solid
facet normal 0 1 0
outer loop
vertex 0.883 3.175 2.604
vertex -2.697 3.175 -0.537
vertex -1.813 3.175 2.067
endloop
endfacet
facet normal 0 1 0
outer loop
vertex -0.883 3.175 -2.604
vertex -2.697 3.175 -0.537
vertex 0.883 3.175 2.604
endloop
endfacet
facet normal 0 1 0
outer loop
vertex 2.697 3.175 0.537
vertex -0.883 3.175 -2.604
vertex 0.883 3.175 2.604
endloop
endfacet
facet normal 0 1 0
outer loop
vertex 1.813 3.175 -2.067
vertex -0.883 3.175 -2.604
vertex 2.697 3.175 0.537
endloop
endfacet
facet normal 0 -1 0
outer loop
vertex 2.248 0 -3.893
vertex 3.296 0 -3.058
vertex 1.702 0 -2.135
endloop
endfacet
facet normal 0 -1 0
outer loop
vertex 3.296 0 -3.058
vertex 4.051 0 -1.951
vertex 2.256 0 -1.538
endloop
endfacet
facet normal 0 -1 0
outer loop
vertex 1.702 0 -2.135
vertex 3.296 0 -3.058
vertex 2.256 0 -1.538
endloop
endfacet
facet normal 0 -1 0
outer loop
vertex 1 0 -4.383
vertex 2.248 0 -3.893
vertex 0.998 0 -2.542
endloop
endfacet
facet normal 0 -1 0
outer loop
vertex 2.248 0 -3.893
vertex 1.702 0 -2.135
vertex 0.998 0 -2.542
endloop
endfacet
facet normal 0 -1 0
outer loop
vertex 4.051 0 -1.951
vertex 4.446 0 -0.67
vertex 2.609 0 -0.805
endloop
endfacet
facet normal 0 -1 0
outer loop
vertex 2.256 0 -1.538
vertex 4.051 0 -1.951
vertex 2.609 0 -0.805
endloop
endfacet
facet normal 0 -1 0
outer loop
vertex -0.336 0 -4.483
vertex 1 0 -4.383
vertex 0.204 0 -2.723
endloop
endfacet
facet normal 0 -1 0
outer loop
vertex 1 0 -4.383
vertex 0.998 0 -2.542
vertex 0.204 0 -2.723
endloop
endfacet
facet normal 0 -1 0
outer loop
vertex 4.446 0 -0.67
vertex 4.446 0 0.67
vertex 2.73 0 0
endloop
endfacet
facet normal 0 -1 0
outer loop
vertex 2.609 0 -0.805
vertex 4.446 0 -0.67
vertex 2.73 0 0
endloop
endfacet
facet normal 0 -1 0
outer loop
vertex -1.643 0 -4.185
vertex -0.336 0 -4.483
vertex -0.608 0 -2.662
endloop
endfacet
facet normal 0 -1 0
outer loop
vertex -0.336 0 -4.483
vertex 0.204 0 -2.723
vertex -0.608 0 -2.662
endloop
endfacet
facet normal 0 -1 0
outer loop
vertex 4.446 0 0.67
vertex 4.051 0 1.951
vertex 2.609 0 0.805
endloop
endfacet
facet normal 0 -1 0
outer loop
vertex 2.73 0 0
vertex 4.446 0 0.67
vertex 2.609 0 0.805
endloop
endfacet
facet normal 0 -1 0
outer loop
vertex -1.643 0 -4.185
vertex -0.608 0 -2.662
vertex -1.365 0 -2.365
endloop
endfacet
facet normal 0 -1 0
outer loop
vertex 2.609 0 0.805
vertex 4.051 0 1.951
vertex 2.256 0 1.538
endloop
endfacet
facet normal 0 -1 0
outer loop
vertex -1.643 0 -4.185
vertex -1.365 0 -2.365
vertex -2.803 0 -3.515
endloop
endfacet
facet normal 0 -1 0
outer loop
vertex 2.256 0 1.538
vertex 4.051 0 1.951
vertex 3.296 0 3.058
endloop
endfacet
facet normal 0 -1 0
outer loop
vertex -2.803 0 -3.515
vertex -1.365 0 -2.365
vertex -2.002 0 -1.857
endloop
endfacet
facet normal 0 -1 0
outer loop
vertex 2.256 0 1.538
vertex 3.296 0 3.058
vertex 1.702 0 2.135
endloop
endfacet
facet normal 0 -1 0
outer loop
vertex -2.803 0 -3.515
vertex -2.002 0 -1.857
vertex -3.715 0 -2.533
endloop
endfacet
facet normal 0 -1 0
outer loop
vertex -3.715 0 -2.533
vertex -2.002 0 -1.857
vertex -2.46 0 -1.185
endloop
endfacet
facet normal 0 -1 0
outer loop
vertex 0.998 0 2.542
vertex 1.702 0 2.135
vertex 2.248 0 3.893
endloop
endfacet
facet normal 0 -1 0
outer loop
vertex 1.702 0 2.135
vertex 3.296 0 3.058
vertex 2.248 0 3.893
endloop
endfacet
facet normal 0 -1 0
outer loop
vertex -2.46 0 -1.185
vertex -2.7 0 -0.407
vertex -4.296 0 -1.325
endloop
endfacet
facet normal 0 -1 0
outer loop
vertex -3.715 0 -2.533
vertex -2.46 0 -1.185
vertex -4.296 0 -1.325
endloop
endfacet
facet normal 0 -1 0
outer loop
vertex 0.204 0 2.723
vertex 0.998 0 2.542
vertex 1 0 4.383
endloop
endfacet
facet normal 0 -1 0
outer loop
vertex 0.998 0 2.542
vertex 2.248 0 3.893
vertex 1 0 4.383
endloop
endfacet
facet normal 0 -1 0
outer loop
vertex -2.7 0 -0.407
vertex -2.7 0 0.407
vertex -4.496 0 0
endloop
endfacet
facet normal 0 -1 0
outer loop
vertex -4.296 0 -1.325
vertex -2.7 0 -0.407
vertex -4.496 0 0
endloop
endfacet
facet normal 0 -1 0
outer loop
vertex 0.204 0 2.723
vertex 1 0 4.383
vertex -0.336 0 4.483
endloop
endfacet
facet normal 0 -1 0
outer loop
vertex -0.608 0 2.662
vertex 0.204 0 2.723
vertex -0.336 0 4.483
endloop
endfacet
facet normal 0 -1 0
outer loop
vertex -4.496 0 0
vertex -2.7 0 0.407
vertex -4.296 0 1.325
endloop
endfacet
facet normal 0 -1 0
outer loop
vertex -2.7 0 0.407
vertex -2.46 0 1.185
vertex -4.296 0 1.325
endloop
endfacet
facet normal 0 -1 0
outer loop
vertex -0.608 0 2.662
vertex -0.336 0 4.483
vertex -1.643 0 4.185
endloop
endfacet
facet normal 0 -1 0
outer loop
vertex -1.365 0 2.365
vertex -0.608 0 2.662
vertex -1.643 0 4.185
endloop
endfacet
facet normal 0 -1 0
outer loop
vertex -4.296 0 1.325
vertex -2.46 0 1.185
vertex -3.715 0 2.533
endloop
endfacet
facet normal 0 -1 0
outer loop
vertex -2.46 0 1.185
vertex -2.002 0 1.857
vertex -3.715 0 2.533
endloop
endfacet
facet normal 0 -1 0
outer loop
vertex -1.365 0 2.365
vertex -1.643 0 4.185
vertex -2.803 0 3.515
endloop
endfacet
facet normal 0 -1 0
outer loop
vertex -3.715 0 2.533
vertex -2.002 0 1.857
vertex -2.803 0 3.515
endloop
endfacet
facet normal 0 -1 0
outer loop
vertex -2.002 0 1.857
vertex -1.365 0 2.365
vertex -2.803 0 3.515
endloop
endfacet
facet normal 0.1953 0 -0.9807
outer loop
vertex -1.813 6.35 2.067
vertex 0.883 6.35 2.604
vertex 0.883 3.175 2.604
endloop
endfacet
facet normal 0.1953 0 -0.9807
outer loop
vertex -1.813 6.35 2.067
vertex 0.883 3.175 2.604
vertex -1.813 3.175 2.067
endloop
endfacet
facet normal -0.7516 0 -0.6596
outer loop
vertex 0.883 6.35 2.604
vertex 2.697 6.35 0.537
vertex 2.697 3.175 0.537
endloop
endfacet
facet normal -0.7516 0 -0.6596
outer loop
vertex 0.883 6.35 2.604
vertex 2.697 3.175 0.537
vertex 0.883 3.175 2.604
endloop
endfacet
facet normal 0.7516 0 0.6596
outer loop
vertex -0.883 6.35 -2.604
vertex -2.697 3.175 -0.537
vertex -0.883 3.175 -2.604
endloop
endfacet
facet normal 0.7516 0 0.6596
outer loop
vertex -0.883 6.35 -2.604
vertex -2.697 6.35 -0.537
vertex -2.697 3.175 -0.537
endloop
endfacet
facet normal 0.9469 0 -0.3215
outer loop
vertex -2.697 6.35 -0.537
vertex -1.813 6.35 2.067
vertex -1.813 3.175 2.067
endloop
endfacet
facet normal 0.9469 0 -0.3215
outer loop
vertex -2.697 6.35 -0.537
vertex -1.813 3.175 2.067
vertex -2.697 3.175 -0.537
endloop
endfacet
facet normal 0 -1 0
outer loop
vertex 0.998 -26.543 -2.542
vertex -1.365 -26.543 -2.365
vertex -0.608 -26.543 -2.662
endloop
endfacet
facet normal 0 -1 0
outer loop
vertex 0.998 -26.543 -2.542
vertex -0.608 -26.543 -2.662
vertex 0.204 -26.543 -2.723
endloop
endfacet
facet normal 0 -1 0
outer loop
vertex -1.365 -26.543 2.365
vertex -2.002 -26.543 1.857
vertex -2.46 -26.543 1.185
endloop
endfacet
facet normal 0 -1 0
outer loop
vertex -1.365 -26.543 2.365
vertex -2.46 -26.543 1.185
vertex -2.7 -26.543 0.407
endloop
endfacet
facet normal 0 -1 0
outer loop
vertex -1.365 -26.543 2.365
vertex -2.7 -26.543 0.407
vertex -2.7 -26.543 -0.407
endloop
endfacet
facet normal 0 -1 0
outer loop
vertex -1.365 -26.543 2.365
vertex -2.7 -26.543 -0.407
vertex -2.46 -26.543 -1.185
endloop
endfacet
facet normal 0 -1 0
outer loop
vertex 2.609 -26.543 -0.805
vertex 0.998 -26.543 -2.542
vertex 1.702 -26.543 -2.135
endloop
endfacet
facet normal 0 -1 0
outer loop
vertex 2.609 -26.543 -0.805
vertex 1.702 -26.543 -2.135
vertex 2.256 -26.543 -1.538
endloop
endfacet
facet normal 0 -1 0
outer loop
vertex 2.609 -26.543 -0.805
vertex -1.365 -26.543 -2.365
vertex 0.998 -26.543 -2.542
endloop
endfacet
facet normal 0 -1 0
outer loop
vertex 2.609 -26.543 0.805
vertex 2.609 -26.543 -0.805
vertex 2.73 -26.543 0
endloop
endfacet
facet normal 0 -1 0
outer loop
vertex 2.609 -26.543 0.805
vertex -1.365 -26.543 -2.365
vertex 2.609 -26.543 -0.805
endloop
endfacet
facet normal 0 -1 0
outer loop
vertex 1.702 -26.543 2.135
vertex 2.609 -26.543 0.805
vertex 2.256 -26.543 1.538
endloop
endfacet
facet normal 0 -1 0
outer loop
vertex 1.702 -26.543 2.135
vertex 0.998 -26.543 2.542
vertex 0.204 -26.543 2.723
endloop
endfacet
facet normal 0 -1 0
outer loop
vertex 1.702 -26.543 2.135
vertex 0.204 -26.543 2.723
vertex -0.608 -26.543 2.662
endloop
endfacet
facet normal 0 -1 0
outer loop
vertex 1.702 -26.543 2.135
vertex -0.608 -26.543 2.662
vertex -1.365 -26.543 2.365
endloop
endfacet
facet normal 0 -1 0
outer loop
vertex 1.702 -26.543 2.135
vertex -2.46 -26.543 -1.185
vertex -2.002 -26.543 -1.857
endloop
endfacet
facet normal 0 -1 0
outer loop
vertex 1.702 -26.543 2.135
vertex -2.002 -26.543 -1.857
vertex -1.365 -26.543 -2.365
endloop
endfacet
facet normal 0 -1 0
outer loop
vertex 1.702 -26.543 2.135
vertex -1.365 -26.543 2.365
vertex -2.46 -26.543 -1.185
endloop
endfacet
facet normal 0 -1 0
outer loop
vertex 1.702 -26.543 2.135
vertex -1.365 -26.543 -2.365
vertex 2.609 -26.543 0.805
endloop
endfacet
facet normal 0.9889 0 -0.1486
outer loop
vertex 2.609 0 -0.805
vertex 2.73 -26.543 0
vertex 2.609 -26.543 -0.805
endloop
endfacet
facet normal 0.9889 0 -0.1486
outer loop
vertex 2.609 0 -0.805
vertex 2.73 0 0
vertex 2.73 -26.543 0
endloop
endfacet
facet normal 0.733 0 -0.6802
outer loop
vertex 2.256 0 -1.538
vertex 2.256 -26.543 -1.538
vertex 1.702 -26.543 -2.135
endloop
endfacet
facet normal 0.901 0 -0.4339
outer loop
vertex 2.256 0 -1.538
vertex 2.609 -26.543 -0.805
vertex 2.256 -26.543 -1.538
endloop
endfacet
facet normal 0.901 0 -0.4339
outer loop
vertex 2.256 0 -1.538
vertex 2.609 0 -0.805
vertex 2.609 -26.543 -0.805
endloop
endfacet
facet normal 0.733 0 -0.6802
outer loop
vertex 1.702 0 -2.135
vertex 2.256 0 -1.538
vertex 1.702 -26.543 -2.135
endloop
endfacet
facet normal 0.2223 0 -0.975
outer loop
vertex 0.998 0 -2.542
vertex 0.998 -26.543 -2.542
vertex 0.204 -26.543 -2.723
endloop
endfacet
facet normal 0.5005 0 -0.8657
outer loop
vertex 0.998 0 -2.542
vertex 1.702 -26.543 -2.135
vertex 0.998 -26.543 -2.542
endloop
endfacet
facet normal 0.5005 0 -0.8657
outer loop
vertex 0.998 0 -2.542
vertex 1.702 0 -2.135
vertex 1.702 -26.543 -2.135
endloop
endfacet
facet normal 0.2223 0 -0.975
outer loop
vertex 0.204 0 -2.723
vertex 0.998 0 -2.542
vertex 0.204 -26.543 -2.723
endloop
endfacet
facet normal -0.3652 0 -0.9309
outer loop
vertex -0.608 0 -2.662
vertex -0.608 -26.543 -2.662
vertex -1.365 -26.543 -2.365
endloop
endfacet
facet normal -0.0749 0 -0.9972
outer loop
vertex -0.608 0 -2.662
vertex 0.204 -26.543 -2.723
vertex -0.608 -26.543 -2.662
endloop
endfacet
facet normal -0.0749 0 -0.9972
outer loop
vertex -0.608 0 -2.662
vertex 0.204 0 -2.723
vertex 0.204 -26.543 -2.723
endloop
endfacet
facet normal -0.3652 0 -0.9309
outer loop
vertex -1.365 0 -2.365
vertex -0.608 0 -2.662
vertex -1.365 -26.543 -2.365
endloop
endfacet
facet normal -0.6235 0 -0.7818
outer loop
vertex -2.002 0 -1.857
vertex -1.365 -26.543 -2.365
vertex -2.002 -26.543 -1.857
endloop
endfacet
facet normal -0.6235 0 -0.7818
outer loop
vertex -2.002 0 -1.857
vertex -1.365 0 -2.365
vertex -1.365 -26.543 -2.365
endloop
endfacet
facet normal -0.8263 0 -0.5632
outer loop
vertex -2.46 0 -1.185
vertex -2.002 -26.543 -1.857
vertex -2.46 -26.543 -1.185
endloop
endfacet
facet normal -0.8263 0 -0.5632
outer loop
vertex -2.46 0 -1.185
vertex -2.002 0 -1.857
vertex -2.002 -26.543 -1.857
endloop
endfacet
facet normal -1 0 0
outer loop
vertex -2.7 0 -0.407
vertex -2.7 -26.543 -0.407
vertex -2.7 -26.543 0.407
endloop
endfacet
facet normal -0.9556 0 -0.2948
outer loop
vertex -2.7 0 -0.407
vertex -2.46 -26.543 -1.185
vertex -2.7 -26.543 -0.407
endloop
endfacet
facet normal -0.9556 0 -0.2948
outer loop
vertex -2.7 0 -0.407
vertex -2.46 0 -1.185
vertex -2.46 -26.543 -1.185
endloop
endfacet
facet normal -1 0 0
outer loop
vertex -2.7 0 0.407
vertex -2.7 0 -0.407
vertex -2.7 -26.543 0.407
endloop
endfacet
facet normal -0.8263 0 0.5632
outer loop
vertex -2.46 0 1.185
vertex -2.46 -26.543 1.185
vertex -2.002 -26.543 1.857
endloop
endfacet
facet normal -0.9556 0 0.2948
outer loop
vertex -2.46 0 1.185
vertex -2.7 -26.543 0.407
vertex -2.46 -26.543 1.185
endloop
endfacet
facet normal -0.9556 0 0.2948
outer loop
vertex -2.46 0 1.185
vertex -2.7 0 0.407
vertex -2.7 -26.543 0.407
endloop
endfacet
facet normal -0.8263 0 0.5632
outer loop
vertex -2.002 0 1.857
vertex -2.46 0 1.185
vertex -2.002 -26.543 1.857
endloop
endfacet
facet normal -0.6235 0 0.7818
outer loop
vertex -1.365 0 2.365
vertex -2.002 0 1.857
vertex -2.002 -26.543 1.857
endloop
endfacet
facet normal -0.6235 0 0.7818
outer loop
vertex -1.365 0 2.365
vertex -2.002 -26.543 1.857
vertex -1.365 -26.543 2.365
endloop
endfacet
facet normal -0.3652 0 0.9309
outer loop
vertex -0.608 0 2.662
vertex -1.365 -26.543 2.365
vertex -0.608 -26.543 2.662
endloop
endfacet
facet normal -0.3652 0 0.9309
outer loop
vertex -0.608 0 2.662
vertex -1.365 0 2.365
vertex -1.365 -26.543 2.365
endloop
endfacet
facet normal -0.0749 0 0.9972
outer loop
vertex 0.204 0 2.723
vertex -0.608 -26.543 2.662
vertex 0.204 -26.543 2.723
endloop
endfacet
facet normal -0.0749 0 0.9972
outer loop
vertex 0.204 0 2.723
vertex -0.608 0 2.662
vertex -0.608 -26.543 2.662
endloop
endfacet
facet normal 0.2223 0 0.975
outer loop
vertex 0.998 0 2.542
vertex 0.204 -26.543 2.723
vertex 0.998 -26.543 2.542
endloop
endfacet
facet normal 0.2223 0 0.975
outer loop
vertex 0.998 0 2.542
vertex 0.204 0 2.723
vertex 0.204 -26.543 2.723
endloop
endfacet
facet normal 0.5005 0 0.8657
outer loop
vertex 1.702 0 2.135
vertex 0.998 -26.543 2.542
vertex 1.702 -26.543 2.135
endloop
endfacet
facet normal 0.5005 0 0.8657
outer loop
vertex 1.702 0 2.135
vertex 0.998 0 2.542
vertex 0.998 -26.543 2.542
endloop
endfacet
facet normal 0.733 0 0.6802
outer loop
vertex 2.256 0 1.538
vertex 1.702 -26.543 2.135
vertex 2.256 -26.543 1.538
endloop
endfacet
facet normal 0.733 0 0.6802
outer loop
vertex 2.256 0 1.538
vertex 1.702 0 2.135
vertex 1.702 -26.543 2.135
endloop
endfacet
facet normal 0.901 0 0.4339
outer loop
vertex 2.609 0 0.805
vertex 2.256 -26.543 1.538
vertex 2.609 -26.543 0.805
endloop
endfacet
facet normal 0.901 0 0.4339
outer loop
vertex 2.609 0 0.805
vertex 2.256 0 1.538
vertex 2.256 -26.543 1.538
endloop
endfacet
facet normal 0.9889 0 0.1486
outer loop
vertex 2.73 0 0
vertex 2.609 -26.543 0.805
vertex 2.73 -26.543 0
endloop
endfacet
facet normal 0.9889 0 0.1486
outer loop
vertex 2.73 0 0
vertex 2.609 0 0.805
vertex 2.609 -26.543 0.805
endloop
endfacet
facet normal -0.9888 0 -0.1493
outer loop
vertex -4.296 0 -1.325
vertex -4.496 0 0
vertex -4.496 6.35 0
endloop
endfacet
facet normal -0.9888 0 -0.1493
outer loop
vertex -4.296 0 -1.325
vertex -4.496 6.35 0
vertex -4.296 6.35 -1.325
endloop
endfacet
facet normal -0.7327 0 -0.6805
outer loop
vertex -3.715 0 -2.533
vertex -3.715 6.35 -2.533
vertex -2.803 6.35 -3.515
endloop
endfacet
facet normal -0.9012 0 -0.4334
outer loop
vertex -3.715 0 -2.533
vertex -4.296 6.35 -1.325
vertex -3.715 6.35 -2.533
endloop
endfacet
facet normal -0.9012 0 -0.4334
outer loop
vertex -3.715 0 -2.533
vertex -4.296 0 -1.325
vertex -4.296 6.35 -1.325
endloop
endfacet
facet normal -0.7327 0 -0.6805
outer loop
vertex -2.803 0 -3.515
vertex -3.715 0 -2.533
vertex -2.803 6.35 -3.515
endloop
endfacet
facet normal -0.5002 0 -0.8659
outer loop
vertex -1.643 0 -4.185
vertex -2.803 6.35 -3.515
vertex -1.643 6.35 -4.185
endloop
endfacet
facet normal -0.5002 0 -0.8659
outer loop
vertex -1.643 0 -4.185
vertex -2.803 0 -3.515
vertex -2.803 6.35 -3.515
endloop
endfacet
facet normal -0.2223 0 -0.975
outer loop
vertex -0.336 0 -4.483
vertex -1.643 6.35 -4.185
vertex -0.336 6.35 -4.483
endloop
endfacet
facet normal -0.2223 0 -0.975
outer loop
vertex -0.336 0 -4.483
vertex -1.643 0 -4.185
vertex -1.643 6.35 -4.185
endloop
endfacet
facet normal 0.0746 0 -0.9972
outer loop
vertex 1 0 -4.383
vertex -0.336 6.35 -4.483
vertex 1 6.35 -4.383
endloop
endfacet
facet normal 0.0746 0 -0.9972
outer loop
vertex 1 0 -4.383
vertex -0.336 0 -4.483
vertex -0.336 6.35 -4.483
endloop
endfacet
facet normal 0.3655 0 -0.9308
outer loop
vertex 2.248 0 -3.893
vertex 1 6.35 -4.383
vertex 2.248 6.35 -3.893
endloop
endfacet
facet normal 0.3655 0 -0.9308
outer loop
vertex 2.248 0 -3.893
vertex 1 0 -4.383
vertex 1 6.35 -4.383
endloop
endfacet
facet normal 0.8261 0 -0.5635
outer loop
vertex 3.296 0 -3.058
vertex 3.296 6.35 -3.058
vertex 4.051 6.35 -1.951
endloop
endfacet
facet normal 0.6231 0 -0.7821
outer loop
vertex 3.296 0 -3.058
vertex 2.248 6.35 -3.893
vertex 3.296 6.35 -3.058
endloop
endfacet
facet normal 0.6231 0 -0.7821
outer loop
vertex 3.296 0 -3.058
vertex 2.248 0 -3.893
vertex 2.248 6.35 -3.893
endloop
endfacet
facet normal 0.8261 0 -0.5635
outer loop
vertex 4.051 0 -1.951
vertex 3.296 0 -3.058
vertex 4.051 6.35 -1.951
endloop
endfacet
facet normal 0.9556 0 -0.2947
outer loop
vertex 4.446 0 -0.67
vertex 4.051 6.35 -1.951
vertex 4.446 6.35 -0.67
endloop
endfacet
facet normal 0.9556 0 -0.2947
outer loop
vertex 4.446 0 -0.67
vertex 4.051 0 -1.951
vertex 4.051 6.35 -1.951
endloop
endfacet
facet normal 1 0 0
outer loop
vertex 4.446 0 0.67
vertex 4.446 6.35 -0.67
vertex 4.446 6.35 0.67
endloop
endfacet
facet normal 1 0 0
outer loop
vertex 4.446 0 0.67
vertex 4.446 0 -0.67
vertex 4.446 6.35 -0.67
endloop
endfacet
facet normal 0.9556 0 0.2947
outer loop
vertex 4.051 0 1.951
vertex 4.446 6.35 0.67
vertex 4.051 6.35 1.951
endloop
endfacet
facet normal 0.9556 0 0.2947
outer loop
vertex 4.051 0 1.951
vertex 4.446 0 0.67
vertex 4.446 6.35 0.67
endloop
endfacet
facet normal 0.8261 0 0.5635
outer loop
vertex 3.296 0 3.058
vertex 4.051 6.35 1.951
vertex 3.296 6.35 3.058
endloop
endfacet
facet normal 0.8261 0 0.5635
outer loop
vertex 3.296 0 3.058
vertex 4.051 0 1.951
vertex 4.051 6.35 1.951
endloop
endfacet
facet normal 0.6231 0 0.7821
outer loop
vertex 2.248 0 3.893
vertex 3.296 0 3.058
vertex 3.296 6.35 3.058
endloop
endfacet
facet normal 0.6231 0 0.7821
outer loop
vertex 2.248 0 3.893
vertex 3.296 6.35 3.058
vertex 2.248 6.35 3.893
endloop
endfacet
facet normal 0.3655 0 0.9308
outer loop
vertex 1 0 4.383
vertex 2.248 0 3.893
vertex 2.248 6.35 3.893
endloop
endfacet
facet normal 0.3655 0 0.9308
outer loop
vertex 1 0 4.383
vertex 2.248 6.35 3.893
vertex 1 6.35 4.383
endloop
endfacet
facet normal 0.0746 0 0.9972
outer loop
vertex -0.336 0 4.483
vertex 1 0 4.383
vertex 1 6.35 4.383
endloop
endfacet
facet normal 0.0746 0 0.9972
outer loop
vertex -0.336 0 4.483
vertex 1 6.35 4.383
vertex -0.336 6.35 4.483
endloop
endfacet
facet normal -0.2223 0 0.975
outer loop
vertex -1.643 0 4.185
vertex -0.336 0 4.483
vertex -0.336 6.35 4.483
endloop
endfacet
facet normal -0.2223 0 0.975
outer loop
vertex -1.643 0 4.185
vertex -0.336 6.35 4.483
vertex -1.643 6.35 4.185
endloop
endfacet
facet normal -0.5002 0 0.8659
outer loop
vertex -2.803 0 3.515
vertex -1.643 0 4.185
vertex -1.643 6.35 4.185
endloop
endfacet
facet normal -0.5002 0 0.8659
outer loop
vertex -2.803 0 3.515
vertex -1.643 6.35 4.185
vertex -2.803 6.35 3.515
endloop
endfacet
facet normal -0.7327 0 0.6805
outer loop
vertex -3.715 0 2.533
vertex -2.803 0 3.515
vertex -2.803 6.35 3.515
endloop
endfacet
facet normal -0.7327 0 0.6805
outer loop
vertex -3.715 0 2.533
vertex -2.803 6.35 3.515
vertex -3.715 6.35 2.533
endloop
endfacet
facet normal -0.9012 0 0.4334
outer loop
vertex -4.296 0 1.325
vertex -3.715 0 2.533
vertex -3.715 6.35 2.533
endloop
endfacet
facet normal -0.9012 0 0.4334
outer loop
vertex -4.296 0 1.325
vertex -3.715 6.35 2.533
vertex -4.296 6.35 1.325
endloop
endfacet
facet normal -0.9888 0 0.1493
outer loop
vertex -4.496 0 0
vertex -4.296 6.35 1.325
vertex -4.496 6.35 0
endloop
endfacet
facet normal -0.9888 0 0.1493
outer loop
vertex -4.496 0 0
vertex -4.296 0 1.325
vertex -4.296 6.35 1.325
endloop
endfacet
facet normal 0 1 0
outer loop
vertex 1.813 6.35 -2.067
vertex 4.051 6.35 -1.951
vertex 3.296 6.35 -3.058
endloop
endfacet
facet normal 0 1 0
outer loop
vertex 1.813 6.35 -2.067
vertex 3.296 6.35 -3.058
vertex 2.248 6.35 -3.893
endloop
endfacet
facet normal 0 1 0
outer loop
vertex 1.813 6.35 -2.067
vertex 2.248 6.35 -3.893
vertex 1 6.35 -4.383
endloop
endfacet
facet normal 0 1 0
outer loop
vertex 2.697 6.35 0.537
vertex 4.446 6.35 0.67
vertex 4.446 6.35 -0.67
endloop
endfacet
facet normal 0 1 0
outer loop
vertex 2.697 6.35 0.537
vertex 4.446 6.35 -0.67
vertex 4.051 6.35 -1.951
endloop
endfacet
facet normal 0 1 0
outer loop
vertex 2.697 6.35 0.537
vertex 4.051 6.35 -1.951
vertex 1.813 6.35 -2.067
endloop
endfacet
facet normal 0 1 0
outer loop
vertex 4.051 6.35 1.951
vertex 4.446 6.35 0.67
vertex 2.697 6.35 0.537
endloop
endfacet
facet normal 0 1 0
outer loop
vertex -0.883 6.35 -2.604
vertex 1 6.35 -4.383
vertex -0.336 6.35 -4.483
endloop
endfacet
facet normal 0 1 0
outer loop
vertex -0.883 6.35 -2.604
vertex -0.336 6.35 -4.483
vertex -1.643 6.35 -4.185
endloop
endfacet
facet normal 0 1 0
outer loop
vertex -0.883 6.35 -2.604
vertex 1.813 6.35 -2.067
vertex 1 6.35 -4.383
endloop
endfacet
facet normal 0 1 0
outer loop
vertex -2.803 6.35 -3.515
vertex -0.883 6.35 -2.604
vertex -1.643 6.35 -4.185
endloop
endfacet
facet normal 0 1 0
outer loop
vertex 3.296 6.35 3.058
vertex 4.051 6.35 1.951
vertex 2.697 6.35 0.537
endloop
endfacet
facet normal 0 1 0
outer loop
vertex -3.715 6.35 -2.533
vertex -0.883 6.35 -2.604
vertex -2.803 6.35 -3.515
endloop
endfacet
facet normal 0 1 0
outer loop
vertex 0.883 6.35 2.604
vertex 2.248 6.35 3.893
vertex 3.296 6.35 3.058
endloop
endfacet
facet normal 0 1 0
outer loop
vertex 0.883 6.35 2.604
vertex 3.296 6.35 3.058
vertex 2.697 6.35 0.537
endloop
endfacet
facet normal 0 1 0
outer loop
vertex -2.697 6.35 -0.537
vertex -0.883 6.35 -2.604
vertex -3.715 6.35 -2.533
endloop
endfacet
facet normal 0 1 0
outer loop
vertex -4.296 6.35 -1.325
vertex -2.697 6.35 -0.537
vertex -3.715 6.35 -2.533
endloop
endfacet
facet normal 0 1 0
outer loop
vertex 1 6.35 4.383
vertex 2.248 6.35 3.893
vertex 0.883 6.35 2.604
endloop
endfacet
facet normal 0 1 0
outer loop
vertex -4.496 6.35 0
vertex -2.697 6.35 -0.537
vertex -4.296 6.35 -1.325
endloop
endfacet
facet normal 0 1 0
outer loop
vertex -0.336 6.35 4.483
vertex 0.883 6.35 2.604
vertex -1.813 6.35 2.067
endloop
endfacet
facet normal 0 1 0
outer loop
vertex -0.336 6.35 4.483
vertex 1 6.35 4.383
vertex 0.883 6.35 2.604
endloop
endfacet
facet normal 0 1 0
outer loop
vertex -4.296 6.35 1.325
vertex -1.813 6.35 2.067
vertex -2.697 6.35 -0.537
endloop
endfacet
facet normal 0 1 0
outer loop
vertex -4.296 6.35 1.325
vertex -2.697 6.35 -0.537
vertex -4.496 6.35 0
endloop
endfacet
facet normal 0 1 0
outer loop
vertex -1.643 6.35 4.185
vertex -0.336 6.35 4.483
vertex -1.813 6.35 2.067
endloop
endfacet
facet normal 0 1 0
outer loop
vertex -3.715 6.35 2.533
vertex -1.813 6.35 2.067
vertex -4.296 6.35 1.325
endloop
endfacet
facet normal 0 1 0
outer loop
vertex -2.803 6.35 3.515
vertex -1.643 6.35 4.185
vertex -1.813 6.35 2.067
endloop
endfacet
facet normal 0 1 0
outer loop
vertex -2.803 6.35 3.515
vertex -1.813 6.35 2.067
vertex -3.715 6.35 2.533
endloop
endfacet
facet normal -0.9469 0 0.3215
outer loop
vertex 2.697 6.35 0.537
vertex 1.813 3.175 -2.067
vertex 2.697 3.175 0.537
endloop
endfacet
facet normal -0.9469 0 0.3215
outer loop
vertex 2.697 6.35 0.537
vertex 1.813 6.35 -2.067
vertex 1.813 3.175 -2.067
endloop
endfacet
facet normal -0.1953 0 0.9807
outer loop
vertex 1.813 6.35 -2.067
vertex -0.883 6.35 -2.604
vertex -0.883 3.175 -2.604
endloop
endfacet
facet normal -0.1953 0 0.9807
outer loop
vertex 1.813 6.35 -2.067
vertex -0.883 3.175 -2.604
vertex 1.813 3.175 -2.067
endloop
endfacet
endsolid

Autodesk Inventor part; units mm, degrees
ref_plane "YZ Plane" through (0, 0, 0) normal (1, 0, 0) x (0, 1, 0)
ref_plane "XZ Plane" through (0, 0, 0) normal (0, 1, 0) x (-1, 0, 0)
ref_plane "XY Plane" through (0, 0, 0) normal (0, 0, 1) x (1, 0, 0)
sketch "Sketch1" plane through (0, 0, 0) normal (0, 1, 0) x (-1, 0, 0)
  circle A0 centre (0, 0) radius 4.4958
  dimension "d0" = 8.9916
extrude "Extrusion1" add sketch "Sketch1" along normal blind 6.35
sketch "Sketch2" plane through (0, 0, 0) normal (0, -1, 0) x (1, 0, 0)
  point P0 (0, 0)
sketch "Sketch4" plane through (0, 6.35, 0) normal (0, 1, 0) x (1, 0, 0)
  circle A0 centre (0, 0) radius 4.4958 projected
  line L0 (-0.8834, 2.6038) -> (1.8133, 2.067)
  line L1 (1.8133, 2.067) -> (2.6967, -0.5368)
  line L2 (2.6967, -0.5368) -> (0.8834, -2.6038)
  line L3 (0.8834, -2.6038) -> (-1.8133, -2.067)
  line L4 (-1.8133, -2.067) -> (-2.6967, 0.5368)
  line L5 (-2.6967, 0.5368) -> (-0.8834, 2.6038)
  dimension "d4" = 4.7625
extrude "Extrusion2" cut sketch "Sketch4" against normal blind 3.175 contours L0 L1 L2 L3 L4 L5
sketch "Sketch5" plane through (0, 0, 0) normal (0, -1, 0) x (1, 0, 0)
  circle A0 centre (0, 0) radius 4.4958 projected
  circle A1 centre (0, 0) radius 2.7305
  dimension "d7" = 5.461
extrude "Extrusion3" add sketch "Sketch5" along normal blind 26.543 contours A1
thread "Thread1" size "1/4-20 UNC" class "2A" standard "ANSI Unified Screw Threads" full length
properties part number "WheelBracketScrew"
